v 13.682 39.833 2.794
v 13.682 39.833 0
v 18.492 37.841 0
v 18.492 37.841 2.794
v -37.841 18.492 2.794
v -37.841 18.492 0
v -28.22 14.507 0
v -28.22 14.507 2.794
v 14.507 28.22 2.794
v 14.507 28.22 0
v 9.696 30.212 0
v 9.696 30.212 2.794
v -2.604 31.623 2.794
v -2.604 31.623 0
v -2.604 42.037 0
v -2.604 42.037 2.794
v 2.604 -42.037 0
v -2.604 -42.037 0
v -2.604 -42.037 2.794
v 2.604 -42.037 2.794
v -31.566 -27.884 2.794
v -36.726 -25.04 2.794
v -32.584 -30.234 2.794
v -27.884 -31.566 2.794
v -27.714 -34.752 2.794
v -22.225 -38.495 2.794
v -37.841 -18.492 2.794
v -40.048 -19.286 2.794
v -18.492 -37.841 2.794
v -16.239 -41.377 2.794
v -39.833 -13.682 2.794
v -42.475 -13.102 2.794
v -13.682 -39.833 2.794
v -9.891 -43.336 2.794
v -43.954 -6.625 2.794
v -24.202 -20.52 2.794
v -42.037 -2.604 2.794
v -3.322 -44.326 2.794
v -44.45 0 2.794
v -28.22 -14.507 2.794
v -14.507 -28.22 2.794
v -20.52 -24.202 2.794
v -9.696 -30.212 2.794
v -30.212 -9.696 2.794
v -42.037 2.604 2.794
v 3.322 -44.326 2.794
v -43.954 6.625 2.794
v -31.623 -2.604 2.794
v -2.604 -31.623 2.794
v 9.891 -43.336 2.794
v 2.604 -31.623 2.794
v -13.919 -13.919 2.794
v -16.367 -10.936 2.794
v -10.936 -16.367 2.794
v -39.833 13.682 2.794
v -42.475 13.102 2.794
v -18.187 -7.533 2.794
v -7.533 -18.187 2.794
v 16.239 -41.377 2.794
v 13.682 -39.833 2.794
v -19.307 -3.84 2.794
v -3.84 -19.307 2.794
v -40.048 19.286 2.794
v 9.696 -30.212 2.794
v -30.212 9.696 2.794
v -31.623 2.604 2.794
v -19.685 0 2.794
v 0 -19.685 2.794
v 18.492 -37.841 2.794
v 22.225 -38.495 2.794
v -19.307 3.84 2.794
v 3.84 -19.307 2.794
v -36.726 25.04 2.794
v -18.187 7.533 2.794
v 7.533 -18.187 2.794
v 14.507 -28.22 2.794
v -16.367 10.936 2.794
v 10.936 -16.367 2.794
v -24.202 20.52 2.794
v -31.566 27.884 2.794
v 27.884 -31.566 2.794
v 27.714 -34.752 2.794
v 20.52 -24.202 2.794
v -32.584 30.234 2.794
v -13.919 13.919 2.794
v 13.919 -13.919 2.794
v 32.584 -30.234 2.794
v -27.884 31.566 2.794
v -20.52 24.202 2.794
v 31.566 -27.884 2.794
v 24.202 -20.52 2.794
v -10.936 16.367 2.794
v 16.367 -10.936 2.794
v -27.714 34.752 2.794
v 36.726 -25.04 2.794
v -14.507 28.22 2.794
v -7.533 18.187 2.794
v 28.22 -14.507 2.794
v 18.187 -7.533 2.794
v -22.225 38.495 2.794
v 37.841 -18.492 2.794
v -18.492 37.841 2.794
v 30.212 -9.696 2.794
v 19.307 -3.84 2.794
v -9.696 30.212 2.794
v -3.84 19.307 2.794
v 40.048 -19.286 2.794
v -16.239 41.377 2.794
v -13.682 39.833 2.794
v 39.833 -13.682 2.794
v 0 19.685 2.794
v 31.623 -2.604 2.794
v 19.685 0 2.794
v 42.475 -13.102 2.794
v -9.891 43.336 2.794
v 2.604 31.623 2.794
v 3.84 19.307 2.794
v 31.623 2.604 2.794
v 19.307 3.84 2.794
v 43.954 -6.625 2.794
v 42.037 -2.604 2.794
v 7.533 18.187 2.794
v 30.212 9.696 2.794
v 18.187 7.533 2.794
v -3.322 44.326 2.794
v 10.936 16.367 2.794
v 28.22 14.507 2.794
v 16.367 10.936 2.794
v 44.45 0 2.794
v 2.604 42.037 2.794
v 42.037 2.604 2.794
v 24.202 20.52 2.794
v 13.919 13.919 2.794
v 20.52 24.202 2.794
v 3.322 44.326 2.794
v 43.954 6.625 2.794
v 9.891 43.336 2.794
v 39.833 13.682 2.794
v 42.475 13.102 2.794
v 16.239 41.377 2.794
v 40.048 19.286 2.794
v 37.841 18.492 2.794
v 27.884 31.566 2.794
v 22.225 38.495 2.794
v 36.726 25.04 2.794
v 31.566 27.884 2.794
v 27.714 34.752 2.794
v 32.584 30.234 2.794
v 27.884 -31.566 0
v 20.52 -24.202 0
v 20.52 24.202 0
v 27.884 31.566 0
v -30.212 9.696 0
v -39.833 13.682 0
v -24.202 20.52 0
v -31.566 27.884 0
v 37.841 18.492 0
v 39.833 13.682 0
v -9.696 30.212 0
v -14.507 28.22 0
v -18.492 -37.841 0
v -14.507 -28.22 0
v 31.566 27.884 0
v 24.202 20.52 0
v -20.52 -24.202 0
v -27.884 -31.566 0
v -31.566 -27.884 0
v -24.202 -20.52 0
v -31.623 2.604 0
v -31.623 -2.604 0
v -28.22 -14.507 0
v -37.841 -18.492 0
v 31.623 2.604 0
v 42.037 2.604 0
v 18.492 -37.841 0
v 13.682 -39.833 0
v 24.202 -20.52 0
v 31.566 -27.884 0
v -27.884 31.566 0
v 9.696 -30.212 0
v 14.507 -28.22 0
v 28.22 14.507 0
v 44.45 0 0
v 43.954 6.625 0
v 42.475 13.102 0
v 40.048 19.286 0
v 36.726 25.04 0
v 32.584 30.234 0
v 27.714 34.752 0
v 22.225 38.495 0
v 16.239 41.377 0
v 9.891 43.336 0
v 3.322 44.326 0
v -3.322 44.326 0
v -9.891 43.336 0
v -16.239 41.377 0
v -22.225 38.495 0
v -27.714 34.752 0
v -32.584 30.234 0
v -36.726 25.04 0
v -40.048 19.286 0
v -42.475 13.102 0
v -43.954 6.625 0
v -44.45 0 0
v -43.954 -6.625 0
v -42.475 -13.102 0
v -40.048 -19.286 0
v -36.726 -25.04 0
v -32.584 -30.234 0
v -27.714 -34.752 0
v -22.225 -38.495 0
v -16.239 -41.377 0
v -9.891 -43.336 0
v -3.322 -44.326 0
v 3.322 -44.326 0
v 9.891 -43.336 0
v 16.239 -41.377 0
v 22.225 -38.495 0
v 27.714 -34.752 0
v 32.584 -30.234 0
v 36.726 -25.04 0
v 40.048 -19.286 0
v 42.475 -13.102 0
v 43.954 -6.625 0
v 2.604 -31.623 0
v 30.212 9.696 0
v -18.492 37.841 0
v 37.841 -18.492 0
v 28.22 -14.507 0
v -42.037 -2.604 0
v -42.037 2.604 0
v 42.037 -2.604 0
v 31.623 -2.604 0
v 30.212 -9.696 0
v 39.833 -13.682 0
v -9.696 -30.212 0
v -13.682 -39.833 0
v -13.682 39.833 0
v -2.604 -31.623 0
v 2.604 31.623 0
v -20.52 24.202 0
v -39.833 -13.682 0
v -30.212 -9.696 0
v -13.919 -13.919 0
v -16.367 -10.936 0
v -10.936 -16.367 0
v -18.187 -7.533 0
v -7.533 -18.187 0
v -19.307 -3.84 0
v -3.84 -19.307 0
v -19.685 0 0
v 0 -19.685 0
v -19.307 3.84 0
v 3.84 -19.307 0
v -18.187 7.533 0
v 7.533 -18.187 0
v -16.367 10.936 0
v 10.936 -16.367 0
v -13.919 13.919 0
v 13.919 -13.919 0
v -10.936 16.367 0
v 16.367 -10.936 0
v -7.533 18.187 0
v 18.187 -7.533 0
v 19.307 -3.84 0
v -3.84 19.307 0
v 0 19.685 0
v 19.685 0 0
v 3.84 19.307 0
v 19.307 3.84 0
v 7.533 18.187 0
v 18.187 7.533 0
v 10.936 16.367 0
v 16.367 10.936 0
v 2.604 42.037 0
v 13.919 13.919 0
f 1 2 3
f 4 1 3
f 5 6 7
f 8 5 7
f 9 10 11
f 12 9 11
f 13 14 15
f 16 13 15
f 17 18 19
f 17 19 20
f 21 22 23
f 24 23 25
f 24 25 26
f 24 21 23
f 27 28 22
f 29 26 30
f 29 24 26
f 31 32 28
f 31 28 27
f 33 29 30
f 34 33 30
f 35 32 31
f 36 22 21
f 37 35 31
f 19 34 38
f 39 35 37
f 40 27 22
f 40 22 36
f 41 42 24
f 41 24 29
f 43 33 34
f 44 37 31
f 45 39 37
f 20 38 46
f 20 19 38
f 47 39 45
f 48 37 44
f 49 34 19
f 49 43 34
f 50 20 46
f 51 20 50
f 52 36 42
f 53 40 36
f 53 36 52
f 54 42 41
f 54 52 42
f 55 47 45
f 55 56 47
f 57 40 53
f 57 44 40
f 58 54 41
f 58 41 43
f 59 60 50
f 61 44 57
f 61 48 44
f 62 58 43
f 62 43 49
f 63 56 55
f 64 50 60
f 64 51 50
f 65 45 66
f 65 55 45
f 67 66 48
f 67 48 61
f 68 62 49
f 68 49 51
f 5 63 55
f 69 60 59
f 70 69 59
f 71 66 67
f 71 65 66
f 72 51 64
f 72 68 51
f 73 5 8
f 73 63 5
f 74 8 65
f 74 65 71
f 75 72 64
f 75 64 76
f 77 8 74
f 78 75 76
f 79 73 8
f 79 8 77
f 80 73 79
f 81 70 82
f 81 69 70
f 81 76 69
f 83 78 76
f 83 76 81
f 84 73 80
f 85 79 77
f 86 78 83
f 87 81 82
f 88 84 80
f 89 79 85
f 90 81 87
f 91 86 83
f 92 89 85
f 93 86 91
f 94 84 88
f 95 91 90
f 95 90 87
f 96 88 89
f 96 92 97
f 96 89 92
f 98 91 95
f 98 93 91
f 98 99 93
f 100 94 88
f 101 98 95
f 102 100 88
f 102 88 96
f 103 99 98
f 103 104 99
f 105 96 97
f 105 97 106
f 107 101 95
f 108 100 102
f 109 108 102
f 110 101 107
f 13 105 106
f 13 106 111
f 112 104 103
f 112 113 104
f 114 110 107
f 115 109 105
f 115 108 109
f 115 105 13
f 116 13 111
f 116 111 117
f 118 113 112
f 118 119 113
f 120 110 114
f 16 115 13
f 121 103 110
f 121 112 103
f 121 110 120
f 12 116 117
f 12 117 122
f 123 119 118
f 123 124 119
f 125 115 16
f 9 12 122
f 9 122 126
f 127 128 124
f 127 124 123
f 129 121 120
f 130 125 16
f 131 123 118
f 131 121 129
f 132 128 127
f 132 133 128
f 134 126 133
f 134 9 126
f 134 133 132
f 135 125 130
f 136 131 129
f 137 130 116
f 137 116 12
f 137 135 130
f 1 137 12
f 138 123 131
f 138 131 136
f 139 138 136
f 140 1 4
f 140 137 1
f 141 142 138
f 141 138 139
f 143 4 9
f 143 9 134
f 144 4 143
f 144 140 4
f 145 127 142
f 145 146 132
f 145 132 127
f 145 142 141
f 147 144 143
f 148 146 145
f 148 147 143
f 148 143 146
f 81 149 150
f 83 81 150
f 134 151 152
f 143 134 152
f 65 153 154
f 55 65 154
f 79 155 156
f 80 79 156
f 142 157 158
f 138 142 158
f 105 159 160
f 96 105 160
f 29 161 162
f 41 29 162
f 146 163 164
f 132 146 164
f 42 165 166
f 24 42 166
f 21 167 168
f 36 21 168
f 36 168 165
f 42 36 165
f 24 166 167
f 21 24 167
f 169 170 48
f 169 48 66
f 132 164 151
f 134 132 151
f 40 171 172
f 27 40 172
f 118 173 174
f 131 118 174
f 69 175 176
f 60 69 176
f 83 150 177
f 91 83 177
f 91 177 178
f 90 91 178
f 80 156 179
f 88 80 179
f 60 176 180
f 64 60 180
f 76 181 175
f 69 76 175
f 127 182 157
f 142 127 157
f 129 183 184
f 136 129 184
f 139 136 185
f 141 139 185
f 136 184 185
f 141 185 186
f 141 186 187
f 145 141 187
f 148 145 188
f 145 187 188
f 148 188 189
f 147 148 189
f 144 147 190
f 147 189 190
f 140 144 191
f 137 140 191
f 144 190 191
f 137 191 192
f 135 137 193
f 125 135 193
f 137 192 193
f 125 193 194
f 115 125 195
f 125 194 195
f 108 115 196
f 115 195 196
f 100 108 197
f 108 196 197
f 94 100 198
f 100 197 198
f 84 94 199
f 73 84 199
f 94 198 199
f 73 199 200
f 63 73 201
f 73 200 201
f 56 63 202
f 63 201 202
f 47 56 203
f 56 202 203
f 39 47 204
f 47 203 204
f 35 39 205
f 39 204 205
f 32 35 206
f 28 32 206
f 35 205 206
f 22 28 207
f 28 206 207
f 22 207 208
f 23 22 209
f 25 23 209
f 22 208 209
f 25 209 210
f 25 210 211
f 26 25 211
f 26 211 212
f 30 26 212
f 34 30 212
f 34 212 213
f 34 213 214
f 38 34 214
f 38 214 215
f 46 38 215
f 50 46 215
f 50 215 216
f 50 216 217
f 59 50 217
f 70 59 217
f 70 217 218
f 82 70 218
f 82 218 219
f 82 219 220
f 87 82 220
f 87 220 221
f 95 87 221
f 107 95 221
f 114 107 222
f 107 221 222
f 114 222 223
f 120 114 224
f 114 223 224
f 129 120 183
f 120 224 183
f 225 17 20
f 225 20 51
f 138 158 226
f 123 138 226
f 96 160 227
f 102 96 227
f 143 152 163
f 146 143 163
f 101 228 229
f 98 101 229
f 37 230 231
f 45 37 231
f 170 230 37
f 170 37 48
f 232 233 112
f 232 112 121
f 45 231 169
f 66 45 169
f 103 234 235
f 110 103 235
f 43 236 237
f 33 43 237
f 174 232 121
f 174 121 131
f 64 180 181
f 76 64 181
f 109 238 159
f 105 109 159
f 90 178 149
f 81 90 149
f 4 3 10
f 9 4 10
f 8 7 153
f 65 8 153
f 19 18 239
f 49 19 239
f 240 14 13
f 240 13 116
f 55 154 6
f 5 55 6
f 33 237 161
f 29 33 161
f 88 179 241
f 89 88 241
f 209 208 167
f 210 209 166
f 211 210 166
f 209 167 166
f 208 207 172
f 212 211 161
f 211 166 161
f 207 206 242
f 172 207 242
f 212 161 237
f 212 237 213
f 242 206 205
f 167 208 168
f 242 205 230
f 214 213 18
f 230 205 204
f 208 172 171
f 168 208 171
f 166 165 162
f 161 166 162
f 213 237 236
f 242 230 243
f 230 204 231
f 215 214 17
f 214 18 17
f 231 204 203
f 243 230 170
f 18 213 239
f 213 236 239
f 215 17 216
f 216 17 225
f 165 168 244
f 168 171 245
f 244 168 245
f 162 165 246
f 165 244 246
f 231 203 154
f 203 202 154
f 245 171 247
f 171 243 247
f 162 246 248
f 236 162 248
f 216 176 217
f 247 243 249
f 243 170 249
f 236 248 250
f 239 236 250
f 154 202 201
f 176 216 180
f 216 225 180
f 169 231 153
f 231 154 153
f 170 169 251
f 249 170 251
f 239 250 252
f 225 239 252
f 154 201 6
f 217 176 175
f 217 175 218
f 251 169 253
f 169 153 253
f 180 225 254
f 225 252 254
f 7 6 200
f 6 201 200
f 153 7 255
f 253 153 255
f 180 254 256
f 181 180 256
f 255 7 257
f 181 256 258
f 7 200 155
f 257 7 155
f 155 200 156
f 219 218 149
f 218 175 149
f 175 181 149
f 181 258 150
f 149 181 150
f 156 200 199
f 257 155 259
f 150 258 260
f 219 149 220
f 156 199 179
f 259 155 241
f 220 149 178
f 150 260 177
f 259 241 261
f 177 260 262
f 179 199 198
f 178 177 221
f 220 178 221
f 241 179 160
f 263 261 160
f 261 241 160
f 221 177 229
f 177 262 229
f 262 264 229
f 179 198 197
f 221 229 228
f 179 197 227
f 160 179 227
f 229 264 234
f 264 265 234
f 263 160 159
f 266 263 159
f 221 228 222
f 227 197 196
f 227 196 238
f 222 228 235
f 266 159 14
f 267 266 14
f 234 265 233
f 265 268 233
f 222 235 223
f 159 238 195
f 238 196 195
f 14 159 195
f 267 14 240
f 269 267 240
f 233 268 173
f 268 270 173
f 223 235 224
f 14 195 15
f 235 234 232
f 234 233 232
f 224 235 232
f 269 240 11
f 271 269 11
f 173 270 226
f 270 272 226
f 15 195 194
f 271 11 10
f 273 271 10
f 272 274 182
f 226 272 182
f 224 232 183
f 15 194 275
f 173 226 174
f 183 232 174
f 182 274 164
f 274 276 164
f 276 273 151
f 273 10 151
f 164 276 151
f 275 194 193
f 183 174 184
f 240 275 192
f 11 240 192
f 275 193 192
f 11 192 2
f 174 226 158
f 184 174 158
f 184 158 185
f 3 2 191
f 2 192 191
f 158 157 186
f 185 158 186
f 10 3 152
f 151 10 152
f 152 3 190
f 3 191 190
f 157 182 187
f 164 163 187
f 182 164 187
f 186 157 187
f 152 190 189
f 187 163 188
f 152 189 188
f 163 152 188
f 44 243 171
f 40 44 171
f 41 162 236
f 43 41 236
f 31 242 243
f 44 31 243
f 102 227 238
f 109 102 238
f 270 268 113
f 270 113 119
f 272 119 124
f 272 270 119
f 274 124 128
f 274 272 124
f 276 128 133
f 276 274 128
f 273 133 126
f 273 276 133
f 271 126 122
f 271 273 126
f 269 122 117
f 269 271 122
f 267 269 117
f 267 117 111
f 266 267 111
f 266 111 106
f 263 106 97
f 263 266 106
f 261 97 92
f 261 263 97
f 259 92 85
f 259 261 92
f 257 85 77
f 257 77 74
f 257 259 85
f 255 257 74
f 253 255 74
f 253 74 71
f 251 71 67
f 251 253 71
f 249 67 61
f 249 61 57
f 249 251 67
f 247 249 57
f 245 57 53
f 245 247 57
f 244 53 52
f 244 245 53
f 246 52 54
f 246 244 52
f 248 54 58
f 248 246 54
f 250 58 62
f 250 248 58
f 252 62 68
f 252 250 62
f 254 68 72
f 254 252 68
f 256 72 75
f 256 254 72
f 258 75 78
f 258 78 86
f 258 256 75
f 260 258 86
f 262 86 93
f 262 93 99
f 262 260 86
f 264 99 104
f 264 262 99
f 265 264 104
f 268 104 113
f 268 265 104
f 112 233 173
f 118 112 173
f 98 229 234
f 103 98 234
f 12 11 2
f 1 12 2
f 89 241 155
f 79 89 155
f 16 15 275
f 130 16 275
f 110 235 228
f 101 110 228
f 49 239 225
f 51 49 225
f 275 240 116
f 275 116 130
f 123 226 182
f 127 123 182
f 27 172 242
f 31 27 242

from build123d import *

# Parameters (mm, degrees)
F0_R     = 44.45
F0_W     = 5.207
F0_H     = 10.414
F0_W_2   = 10.414
F0_H_2   = 5.207
F0_R_2   = 19.685
F1_DEPTH = 2.794


with BuildPart() as f1:
    # F0 (on Top) → F1 (new body)
    with BuildSketch(Plane.XY):
        Circle(F0_R)
        Polygon((-24.20179, -20.519885), (-20.519885, -24.20179), (-27.883695, -31.5656), (-31.5656, -27.883695), align=None, mode=Mode.SUBTRACT)
        Polygon((-14.506919, -28.219526), (-9.696278, -30.212159), (-13.681543, -39.83344), (-18.492184, -37.840808), align=None, mode=Mode.SUBTRACT)
        Polygon((-30.212159, -9.696278), (-28.219526, -14.506919), (-37.840808, -18.492184), (-39.83344, -13.681543), align=None, mode=Mode.SUBTRACT)
        with Locations((0, -36.83)):
            Rectangle(F0_W, F0_H, mode=Mode.SUBTRACT)
        Polygon((9.696278, -30.212159), (14.506919, -28.219526), (18.492184, -37.840808), (13.681543, -39.83344), align=None, mode=Mode.SUBTRACT)
        Polygon((20.519885, -24.20179), (24.20179, -20.519885), (31.5656, -27.883695), (27.883695, -31.5656), align=None, mode=Mode.SUBTRACT)
        Polygon((28.219526, -14.506919), (30.212159, -9.696278), (39.83344, -13.681543), (37.840808, -18.492184), align=None, mode=Mode.SUBTRACT)
        with Locations((-36.83, 0)):
            Rectangle(F0_W_2, F0_H_2, mode=Mode.SUBTRACT)
        Polygon((-28.219526, 14.506919), (-30.212159, 9.696278), (-39.83344, 13.681543), (-37.840808, 18.492184), align=None, mode=Mode.SUBTRACT)
        Polygon((-20.519885, 24.20179), (-24.20179, 20.519885), (-31.5656, 27.883695), (-27.883695, 31.5656), align=None, mode=Mode.SUBTRACT)
        Polygon((-9.696278, 30.212159), (-14.506919, 28.219526), (-18.492184, 37.840808), (-13.681543, 39.83344), align=None, mode=Mode.SUBTRACT)
        Circle(F0_R_2, mode=Mode.SUBTRACT)
        with Locations((36.83, 0)):
            Rectangle(F0_W_2, F0_H_2, mode=Mode.SUBTRACT)
        Polygon((30.212159, 9.696278), (28.219526, 14.506919), (37.840808, 18.492184), (39.83344, 13.681543), align=None, mode=Mode.SUBTRACT)
        with Locations((0, 36.83)):
            Rectangle(F0_W, F0_H, mode=Mode.SUBTRACT)
        Polygon((14.506919, 28.219526), (9.696278, 30.212159), (13.681543, 39.83344), (18.492184, 37.840808), align=None, mode=Mode.SUBTRACT)
        Polygon((24.20179, 20.519885), (20.519885, 24.20179), (27.883695, 31.5656), (31.5656, 27.883695), align=None, mode=Mode.SUBTRACT)
    extrude(amount=F1_DEPTH)


solid = f1.part
